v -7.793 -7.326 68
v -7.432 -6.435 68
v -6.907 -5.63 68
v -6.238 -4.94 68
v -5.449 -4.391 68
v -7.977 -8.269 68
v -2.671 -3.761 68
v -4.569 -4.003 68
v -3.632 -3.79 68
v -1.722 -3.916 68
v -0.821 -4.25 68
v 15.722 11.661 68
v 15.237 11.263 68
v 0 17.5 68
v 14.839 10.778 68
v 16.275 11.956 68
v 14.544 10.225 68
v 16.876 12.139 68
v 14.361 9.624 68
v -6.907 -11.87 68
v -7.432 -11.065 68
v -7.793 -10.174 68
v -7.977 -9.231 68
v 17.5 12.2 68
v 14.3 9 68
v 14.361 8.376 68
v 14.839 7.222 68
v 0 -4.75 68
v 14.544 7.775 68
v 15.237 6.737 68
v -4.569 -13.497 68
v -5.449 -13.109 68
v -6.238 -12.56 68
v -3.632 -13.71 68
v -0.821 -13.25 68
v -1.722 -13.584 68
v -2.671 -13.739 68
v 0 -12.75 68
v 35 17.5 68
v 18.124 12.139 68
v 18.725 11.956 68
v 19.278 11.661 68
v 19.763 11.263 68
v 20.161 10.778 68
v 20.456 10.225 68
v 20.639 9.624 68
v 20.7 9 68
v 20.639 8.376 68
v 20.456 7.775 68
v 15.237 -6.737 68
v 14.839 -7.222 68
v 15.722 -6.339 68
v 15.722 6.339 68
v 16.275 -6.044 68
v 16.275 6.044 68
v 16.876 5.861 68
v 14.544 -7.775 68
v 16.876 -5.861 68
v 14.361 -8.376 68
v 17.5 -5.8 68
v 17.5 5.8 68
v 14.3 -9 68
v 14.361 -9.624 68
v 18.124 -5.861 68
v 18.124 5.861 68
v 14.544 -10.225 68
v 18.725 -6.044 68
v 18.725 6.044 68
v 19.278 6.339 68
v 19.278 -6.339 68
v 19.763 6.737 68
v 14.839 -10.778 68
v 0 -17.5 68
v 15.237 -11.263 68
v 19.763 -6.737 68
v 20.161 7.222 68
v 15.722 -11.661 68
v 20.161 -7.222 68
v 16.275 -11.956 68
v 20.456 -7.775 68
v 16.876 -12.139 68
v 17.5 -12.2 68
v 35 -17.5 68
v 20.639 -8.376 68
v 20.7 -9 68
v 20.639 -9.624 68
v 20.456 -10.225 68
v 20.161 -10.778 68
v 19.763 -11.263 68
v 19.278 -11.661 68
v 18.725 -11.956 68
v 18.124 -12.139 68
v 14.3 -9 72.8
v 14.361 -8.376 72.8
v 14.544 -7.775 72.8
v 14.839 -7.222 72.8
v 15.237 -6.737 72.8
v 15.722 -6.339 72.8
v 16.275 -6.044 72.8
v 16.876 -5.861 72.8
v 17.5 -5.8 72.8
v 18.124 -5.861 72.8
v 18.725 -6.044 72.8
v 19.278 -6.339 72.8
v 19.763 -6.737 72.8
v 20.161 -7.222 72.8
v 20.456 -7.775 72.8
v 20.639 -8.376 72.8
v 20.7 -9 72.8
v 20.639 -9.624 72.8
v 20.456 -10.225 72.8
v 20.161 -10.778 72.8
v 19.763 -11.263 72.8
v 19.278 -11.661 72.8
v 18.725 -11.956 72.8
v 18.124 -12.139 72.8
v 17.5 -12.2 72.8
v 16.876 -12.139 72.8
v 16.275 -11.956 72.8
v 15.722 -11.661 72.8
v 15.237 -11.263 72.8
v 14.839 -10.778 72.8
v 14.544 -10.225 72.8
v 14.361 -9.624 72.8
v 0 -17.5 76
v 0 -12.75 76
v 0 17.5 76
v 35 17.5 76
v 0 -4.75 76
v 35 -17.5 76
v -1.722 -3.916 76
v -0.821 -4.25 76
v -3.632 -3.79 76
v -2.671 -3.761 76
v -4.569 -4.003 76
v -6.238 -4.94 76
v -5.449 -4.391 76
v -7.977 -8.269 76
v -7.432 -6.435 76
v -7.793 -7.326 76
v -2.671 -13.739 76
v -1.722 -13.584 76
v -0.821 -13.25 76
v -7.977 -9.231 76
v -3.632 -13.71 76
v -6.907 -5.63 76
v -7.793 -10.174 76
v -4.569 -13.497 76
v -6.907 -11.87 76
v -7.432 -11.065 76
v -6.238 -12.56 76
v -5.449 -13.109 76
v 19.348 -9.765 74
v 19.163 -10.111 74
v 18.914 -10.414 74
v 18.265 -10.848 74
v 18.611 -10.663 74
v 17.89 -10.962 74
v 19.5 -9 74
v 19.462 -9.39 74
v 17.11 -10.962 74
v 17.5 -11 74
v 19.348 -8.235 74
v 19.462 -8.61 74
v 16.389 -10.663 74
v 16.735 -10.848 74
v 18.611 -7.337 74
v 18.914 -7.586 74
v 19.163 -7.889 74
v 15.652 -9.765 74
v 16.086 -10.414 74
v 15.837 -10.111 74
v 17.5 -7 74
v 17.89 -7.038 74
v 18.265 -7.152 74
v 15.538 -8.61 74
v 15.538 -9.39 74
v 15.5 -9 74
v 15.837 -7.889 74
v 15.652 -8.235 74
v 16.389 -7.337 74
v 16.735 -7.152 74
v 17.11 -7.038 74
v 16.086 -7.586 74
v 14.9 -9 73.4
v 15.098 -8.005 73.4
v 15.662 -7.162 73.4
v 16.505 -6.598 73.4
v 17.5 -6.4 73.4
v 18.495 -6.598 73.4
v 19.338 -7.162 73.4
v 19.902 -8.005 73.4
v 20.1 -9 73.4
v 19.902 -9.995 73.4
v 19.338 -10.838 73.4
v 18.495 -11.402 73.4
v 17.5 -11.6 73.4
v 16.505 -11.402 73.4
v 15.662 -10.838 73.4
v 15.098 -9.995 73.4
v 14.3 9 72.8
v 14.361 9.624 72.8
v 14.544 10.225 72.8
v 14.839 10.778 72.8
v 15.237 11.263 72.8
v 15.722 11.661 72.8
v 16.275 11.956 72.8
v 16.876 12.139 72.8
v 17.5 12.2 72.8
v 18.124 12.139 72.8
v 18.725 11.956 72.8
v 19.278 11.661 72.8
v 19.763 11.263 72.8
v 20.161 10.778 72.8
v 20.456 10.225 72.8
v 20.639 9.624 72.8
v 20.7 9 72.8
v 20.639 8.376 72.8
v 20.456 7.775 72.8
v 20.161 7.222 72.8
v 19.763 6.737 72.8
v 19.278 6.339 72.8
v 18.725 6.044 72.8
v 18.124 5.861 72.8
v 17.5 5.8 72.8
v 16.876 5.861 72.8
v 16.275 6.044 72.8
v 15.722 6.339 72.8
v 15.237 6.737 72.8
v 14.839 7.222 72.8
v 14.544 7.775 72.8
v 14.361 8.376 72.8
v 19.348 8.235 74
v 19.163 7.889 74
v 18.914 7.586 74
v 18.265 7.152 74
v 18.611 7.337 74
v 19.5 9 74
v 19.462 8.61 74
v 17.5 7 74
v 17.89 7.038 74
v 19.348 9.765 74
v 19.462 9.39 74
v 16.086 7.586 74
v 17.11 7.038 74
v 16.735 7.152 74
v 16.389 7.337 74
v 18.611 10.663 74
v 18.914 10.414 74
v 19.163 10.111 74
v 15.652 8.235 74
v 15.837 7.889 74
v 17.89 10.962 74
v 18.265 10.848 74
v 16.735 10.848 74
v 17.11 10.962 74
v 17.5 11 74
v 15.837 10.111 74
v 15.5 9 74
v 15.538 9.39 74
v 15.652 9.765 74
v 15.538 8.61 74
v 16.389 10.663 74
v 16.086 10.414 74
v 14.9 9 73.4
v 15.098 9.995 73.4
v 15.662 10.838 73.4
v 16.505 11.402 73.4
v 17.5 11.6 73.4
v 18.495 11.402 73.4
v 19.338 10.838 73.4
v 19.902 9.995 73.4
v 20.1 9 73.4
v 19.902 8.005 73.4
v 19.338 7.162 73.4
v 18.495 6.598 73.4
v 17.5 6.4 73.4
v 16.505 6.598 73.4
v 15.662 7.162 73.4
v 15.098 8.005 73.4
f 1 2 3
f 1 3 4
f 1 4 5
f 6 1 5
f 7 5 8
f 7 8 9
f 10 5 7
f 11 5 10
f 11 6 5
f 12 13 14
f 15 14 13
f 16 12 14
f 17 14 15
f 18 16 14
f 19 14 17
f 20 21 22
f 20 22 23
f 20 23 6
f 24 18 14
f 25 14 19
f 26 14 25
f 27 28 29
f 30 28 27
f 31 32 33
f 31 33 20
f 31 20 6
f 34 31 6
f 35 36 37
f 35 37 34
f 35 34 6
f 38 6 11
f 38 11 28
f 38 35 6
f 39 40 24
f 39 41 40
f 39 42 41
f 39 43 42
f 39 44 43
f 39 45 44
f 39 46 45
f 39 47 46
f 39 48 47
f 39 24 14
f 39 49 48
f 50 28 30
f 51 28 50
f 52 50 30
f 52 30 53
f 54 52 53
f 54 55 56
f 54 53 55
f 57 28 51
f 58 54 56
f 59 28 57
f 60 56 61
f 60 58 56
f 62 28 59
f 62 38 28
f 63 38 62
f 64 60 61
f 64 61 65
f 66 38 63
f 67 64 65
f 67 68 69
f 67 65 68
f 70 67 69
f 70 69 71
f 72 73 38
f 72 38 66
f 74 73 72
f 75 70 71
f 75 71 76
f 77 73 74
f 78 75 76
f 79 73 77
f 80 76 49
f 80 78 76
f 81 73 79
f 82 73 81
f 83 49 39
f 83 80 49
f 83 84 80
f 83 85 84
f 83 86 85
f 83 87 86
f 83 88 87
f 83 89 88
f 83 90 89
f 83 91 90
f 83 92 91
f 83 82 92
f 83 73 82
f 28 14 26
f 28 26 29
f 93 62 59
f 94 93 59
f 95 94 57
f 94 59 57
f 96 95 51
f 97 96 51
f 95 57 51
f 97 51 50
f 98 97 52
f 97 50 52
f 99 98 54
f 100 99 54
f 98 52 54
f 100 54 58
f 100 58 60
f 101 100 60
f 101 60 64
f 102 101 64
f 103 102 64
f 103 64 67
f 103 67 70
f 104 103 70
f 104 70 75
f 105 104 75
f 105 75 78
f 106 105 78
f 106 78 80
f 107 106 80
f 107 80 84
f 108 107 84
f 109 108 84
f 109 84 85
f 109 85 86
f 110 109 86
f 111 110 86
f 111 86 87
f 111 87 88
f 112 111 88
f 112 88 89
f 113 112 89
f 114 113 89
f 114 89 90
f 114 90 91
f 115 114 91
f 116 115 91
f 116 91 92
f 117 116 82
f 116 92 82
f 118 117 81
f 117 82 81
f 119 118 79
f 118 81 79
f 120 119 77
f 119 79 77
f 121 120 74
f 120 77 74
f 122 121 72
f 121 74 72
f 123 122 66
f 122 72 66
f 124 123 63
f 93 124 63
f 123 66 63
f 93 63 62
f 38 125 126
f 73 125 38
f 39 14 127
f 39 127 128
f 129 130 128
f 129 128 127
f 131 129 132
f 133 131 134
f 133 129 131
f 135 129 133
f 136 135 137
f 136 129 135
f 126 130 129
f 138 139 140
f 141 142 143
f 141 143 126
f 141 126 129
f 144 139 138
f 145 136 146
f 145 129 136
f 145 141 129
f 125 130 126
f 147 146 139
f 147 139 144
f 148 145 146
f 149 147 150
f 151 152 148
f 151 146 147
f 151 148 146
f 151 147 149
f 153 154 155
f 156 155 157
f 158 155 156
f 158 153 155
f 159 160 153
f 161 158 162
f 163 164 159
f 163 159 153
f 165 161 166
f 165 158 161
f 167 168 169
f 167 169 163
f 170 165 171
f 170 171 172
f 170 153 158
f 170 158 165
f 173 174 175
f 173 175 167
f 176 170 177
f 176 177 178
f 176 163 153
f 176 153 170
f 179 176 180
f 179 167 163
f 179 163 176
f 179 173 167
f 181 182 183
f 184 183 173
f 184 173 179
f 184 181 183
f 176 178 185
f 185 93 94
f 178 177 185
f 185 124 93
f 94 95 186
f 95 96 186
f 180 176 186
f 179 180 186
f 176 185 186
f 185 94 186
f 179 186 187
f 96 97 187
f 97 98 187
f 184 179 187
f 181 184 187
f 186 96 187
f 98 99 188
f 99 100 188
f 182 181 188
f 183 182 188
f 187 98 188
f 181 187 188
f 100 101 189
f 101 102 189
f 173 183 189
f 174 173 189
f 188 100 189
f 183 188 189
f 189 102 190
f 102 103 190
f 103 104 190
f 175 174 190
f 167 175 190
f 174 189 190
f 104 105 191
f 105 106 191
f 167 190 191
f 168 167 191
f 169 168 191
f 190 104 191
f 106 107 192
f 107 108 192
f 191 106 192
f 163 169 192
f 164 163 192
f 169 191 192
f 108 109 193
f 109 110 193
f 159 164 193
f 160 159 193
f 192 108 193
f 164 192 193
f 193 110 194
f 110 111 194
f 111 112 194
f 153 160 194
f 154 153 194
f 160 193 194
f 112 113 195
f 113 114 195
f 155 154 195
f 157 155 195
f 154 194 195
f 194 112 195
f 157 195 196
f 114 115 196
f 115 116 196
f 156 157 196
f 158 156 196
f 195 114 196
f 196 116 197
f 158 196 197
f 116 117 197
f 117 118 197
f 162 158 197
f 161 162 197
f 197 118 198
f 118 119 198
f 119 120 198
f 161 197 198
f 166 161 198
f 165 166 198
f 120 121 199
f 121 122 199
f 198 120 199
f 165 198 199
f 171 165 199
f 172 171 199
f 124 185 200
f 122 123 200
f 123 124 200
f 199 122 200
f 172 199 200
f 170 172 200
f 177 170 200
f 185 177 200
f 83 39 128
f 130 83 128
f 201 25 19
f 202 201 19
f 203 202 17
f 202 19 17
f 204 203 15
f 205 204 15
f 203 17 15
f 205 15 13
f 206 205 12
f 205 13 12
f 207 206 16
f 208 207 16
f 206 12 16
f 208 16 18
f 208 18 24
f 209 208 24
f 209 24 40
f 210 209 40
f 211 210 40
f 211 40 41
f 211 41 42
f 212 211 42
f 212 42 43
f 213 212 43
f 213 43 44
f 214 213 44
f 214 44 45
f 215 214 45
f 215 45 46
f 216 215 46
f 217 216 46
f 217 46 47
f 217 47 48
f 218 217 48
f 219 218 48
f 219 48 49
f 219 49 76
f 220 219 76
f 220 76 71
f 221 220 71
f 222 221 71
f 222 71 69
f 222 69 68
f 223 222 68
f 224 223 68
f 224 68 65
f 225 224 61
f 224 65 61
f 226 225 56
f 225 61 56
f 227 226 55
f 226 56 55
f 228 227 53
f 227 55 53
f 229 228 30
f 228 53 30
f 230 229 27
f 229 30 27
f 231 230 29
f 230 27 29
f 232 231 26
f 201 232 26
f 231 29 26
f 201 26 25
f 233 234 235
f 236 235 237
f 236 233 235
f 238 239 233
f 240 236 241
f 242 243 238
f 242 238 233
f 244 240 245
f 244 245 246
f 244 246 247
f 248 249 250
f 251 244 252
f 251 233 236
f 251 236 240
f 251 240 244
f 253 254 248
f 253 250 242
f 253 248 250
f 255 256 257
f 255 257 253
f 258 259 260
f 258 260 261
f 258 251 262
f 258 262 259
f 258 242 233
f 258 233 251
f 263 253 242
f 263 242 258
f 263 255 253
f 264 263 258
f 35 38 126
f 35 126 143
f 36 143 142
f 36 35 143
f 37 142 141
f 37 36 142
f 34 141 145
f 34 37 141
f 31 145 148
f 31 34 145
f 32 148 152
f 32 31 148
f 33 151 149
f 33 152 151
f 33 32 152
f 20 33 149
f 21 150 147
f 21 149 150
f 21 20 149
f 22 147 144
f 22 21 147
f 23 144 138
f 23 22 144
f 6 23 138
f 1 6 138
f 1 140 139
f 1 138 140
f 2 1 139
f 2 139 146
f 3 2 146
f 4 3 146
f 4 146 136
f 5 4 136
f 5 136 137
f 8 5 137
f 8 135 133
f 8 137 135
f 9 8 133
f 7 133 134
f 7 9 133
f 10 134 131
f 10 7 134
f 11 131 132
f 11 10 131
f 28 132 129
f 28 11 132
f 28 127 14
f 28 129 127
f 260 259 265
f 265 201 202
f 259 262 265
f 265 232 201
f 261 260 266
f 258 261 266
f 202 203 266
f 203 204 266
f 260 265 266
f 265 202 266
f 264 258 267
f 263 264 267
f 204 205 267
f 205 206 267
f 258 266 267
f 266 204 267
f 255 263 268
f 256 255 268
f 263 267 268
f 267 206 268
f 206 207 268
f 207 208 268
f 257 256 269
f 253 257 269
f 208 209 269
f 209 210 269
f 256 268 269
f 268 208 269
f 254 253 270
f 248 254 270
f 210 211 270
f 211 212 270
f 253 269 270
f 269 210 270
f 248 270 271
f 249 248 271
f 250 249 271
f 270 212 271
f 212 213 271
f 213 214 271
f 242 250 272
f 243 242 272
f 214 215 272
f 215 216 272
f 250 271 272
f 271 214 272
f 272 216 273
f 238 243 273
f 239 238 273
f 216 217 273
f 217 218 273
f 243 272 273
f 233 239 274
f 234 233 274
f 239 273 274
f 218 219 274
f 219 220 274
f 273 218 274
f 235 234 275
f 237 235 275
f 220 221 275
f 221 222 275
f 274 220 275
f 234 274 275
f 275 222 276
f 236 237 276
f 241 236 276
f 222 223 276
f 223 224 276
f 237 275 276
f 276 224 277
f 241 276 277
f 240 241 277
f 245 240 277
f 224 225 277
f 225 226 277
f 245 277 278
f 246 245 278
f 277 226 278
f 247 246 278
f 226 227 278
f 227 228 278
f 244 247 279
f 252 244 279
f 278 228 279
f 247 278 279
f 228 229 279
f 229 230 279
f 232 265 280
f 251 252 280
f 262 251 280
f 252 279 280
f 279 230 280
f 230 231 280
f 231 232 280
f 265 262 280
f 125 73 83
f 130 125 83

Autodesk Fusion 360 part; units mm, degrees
sketch "Platform" plane through (0, 0, 0) normal (0, 1, 0) x (1, 0, 0)
  line L0 (35, -68) -> (35, -60)
  line L1 (0, -76) -> (0, -68)
  line L2 (0, -68) -> (35, -68)
  line L3 (35, -60) -> (0, -60)
  line L4 (35, -76) -> (0, -76)
  line L5 (0, -60) -> (0, -68)
  line L6 (35, -68) -> (35, -76)
  line L7 (0, -68) -> (35, -68)
  dimension "d1" = 8
  dimension "d2" = 35
  dimension "d3" = 60
  dimension "d4" = 8
extrude "Extrude1" add sketch "Platform" along normal mid plane 35 contours L1 L2 L4 L6 L7
sketch "Puzzle" plane through (0, 0, 68) normal (0, 0, -1) x (-1, 0, 0)
  line L0 (0, -17.5) -> (0, 17.5)
  line L1 (0, 17.5) -> (-35, 17.5)
  line L2 (-35, 17.5) -> (-35, -17.5)
  line L3 (-35, -17.5) -> (0, -17.5)
  circle A0 centre (-3, 8.75) radius 5.2
  line L4 (0, -17.5) -> (-35, 0) construction
  line L5 (-17.5, -17.5) -> (-17.5, 0) construction
  line L6 (0, -17.5) -> (0, 17.5)
  circle A1 centre (3, 8.75) radius 5 construction
  line L7 (-32, -13.95) -> (-32, -3.55) construction
  circle A2 centre (-32, -8.75) radius 5.2
  circle A3 centre (-32, 8.75) radius 5.2 construction
  circle A4 centre (-32, -8.75) radius 5 construction
  line L8 (0, 0) -> (-35, 0) construction
  line L9 (0, 0) -> (-35, -17.5) construction
  circle A5 centre (-38, 8.75) radius 5
  line L10 (0, 17.5) -> (-35, 17.5)
  circle A6 centre (3, -8.75) radius 5
  line L11 (3, -13.75) -> (3, -3.75) construction
  line L12 (-35, -17.5) -> (0, -17.5)
  line L13 (-35, 17.5) -> (-35, -17.5)
  point P0 (-17.5, -8.75)
  dimension "d11" = 10
  dimension "d12" = 3
  dimension "d13" = 3
  dimension "d14" = 0.2
sketch "Adapter" plane through (0, 0, 68) normal (0, 0, -1) x (-1, 0, 0)
  line L0 (-35, 17.5) -> (-35, -17.5)
  line L1 (-35, -17.5) -> (0, -17.5)
  line L2 (0, -17.5) -> (0, 17.5)
  line L3 (0, 17.5) -> (-35, 17.5)
  circle A0 centre (-17.5, -9) radius 3
  circle A1 centre (-17.5, 9) radius 3
  line L4 (0, -6) -> (-35, -6) construction
  circle A2 centre (-17.5, 9) radius 3.2
  line L5 (0, 0) -> (-35, 0) construction
  circle A3 centre (-17.5, -9) radius 3.2
  line L6 (-35, -17.5) -> (0, 0) construction
  line L7 (0, -17.5) -> (-35, 0) construction
  line L8 (-17.5, -8.75) -> (-17.5, 0) construction
  point P0 (-17.5, 0)
  dimension "d26" = 6
  dimension "d27" = 0.2
  dimension "d28" = 6
extrude "Extrude6" cut sketch "Adapter" against normal blind 6 contours A0 | A1 | A2 | A3
chamfer "Chamfer1" distance 1.2 angle 45 2 edges at (20.4834, 10.1572, 74) (20.4834, -7.8428, 74)
extrude "PuzzleHoleLeft" cut sketch "Puzzle" against normal up to surface (8 mm away) contours L0 A0 L6 picked at (0.9006, 8.8366)
extrude "PuzzleHoleRight" [suppressed]
extrude "PuzzleStumpLeft" add sketch "Puzzle" against normal up to surface (8 mm away) contours L0 L6 A6 picked at (2.5946, -9.2349)
extrude "PuzzleStumpRight" [suppressed]
equation "d1 = PlatformHeight"
equation "d2 = LetterWidth"
equation "d3 = AdapterOffset"
equation "d4 = AdapterHeight"
equation "AdapterOffset = 60 mm"
equation "AdapterHeight = 8 mm"
equation "PlatformHeight = 8 mm"
equation "LetterWidth = 35 mm"
equation "d9 = LetterWidth"
equation "d11 = PuzzleRadius"
equation "d12 = PuzzleOffset"
equation "d13 = PuzzleOffset"
equation "d14 = Gap"
equation "PuzzleOffset = 3 mm"
equation "PuzzleRadius = 10 mm"
equation "Gap = 0.2 mm"
equation "d26 = AdapterHoleRadius"
equation "d27 = Gap"
equation "d28 = AdapterHoleSpread"
equation "AdapterHoleSpread = 6 mm"
equation "AdapterHoleRadius = 6 mm"
equation "AdapterHoleDepth = 6 mm"
equation "AdapterHoleBevel = 1.2 mm"
equation "d35 = AdapterHoleBevel"
